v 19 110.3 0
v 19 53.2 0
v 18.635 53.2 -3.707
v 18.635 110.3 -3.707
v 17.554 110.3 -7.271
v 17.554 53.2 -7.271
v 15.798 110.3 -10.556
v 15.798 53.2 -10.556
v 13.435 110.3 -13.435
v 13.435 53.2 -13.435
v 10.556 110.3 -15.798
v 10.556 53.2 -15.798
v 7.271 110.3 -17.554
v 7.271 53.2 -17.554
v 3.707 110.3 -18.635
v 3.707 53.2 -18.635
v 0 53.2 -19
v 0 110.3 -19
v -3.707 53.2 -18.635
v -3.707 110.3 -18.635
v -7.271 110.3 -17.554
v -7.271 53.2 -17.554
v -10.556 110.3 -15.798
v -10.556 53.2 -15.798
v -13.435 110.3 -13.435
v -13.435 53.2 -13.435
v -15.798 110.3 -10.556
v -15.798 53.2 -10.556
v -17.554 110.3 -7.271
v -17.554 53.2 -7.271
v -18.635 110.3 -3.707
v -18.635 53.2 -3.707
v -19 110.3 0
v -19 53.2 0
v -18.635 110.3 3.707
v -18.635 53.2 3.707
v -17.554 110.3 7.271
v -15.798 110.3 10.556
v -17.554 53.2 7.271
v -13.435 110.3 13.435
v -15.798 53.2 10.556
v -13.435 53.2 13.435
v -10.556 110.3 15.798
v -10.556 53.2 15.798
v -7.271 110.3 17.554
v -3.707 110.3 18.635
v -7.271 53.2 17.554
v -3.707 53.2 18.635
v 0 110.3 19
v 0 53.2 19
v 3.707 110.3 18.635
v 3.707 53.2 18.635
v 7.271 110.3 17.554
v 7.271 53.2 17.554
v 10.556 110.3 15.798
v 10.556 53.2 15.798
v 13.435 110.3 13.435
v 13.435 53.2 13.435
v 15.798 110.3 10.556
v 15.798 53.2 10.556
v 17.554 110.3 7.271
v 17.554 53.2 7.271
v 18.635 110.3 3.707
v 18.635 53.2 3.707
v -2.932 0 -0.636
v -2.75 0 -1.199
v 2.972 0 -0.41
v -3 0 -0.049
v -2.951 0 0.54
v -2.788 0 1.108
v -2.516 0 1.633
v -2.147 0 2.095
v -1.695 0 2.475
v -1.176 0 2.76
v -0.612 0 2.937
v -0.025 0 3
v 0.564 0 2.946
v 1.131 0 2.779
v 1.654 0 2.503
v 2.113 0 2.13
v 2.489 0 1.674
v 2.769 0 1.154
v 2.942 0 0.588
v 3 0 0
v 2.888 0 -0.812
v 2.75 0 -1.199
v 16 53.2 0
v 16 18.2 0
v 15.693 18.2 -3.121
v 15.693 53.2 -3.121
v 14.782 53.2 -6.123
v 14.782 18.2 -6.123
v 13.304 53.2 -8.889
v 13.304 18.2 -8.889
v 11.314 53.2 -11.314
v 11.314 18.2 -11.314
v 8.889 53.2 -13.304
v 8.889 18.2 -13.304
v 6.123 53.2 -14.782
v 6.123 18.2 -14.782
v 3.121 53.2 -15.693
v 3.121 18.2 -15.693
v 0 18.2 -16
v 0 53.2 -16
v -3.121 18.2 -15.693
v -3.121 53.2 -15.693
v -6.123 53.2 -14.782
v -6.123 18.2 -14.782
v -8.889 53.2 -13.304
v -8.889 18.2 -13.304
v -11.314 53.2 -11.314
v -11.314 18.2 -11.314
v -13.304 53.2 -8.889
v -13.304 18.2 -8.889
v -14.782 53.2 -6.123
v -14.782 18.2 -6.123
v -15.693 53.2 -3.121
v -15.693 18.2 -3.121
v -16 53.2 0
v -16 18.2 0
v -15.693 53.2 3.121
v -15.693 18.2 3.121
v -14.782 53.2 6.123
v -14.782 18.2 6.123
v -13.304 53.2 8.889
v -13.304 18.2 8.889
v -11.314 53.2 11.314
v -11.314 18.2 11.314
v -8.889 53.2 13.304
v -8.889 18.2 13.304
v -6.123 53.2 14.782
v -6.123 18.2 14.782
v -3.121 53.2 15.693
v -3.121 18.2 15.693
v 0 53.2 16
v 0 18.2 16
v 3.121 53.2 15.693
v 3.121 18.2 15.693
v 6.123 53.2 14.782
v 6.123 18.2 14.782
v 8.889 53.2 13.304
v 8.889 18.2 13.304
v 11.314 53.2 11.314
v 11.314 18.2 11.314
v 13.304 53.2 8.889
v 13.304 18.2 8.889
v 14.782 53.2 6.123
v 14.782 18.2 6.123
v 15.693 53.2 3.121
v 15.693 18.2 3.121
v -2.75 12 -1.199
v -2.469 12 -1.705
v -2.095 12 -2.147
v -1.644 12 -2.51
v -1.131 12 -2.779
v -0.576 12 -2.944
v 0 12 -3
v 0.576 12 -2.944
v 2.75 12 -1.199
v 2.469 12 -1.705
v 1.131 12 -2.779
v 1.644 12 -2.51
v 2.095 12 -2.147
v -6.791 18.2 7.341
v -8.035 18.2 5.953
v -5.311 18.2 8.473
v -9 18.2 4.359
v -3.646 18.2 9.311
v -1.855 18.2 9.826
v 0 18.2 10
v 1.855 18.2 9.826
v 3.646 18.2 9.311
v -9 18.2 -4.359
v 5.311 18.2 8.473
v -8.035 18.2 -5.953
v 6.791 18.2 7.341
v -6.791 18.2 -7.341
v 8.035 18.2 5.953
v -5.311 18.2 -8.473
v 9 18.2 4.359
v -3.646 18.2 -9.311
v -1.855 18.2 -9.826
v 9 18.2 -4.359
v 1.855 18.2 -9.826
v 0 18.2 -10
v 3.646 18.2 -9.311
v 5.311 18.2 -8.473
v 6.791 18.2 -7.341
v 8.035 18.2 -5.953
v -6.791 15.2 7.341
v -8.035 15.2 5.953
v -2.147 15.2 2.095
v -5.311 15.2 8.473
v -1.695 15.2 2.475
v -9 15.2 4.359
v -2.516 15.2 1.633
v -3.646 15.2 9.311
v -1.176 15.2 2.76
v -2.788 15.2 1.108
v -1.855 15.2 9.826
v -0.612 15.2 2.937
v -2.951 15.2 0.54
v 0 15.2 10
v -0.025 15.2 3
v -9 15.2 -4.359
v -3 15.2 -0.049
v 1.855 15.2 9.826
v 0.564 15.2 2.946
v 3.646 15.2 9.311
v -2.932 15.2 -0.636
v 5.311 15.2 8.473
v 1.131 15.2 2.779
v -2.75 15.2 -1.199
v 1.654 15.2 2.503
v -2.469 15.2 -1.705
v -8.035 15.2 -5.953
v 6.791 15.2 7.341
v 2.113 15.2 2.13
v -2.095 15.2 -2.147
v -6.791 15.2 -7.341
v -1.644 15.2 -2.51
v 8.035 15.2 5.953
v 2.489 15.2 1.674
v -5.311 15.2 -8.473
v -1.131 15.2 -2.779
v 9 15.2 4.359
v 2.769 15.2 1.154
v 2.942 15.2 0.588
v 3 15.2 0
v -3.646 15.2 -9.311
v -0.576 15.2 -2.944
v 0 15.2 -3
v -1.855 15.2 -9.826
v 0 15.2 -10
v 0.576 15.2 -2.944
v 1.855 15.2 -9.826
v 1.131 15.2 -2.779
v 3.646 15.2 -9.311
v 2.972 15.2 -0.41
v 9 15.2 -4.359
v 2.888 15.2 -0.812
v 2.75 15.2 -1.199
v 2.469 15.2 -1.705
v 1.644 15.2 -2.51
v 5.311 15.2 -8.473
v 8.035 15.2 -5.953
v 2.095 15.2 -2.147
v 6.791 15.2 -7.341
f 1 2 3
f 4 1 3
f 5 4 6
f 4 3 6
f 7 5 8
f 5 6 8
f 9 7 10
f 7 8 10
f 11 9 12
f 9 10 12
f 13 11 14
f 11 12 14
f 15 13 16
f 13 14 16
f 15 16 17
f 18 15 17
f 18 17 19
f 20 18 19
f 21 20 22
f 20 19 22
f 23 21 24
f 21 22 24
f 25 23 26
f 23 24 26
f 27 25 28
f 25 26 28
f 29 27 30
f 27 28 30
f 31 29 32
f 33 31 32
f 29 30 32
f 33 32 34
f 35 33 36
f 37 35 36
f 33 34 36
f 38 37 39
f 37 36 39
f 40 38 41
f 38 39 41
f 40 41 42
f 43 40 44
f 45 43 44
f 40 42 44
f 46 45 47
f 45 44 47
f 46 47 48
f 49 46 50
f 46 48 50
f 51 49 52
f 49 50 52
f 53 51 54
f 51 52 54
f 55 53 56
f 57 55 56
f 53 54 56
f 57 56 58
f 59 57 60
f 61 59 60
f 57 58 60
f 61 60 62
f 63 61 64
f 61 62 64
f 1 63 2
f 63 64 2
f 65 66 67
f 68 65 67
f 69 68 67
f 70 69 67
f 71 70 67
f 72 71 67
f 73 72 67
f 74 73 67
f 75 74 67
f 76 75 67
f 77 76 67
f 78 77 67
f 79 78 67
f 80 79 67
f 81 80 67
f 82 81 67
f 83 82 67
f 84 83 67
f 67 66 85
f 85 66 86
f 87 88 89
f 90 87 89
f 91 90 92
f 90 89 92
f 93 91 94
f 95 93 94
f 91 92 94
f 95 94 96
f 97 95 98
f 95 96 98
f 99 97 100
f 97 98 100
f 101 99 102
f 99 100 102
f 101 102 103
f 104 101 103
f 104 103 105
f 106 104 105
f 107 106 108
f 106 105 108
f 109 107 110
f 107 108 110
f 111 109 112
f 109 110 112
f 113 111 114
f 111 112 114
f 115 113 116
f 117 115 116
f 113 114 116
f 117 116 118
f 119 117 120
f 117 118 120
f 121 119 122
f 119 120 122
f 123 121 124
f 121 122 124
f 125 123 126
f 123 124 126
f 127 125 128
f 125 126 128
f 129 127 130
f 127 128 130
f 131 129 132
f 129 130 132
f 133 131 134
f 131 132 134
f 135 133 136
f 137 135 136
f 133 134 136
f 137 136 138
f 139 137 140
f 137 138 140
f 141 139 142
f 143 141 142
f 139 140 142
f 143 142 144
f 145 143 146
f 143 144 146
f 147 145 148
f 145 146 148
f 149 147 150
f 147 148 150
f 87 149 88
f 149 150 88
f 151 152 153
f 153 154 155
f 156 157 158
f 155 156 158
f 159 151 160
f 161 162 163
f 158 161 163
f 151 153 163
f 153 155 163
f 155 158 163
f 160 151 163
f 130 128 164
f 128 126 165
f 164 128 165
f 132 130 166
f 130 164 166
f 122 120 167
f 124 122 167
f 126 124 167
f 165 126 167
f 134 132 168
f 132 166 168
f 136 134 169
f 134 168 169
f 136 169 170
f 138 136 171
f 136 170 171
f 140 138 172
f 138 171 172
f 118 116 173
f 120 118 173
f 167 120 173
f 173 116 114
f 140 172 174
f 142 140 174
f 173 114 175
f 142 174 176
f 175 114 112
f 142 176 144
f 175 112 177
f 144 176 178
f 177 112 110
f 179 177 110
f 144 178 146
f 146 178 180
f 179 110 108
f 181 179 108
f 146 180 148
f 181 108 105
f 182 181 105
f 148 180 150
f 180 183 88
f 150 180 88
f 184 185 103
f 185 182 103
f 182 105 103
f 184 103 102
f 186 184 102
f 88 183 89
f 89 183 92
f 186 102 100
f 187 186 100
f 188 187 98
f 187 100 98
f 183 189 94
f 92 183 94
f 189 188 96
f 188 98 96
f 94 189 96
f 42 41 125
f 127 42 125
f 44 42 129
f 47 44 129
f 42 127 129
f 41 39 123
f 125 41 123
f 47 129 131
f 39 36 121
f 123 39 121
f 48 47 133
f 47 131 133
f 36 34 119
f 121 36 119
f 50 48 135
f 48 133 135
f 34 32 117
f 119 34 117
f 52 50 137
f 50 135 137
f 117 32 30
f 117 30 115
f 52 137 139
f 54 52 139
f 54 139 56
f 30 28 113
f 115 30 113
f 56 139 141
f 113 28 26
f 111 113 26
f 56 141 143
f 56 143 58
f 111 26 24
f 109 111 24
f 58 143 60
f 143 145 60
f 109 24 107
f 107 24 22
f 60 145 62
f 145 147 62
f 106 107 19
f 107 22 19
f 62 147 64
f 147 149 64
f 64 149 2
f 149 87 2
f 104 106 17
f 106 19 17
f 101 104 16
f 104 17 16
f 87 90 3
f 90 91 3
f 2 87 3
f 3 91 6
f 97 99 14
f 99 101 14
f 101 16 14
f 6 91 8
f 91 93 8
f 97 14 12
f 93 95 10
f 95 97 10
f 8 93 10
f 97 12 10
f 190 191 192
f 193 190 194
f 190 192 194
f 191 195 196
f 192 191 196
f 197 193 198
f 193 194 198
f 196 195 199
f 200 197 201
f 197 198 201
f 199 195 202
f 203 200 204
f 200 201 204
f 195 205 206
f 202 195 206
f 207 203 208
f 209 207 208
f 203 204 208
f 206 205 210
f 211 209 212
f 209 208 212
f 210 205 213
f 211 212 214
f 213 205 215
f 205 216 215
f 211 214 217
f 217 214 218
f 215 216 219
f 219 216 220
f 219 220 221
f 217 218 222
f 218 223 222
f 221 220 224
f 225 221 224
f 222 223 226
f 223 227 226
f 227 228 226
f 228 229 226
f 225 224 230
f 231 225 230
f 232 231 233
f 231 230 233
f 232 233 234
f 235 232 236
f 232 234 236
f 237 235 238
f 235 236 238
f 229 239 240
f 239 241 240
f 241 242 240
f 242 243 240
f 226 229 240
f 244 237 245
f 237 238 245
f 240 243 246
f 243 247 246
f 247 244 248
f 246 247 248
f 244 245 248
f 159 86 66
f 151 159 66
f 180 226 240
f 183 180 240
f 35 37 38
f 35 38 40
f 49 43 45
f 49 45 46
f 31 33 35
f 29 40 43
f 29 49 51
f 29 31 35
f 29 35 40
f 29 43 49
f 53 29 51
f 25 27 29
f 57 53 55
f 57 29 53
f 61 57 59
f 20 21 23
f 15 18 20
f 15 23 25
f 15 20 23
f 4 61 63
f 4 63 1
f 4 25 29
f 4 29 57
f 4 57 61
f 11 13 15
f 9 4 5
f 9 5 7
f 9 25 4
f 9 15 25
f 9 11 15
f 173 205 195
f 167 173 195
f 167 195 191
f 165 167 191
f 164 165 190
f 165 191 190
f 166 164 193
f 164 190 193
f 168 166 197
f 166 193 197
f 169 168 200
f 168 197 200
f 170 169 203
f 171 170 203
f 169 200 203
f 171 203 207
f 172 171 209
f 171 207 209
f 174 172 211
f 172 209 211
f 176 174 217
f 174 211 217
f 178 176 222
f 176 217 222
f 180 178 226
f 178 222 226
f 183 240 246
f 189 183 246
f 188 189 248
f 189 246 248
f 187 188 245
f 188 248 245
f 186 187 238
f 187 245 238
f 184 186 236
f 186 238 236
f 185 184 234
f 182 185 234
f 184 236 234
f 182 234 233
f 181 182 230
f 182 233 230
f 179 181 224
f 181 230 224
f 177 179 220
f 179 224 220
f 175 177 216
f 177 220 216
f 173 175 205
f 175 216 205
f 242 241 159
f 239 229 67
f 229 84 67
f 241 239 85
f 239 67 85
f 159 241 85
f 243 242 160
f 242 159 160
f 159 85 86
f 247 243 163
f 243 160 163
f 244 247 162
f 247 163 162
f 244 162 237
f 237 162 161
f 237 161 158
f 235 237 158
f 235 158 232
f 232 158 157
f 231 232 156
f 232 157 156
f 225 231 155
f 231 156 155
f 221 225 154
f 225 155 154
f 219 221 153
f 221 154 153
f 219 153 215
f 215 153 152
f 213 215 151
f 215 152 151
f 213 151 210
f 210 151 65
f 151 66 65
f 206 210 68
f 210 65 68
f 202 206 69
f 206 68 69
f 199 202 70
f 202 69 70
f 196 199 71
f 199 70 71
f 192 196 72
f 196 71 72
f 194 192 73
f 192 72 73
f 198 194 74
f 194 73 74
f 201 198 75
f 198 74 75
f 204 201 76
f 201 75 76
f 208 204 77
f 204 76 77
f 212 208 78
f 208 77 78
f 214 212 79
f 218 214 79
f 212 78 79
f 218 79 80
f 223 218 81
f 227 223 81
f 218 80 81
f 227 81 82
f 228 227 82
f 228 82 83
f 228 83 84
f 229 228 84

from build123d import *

# Parameters (mm, degrees)
BOSS_EXTRUDE1_DEPTH = 12
BOSS_EXTRUDE2_DEPTH = 3.2
BOSS_EXTRUDE3_DEPTH = 3
SKETCH6_R           = 16
BOSS_EXTRUDE4_DEPTH = 35
SKETCH7_R           = 19
BOSS_EXTRUDE5_DEPTH = 57.1


with BuildPart() as part:
    # Sketch2 → Boss-Extrude1 (new body)
    with BuildSketch(Plane(origin=(0, 0, 0), x_dir=(1, 0, 0), z_dir=(0, 1, 0))):
        with BuildLine():
            Line((2.75, 1.198957881), (-2.75, 1.198957881))
            ThreePointArc((-2.75, 1.198957881), (-0.612372436, -2.936835031), (3, 0))
            ThreePointArc((3, 0), (2.936835031, 0.612372436), (2.75, 1.198957881))
        make_face()
    extrude(amount=BOSS_EXTRUDE1_DEPTH)

    # Sketch3 → Boss-Extrude2 (add)
    with BuildSketch(Plane(origin=(0, 12, 0), x_dir=(1, 0, 0), z_dir=(0, 1, 0))):
        with BuildLine():
            Line((2.75, 1.198957881), (-2.75, 1.198957881))
            ThreePointArc((-2.75, 1.198957881), (-0.612372436, -2.936835031), (3, 0))
            ThreePointArc((3, 0), (2.936835031, 0.612372436), (2.75, 1.198957881))
        make_face()
        with BuildLine():
            ThreePointArc((2.75, 1.198957881), (0, 3), (-2.75, 1.198957881))
            Line((-2.75, 1.198957881), (2.75, 1.198957881))
        make_face()
        with BuildLine():
            ThreePointArc((-2.75, 1.198957881), (0, -3), (2.75, 1.198957881))
            Line((2.75, 1.198957881), (-2.75, 1.198957881))
        make_face()
    extrude(amount=BOSS_EXTRUDE2_DEPTH)

    # Sketch5 → Boss-Extrude3 (add)
    with BuildSketch(Plane(origin=(0, 15.2, 0), x_dir=(1, 0, 0), z_dir=(0, 1, 0))):
        with BuildLine():
            Line((-9, 4.358898944), (-9, -4.358898944))
            ThreePointArc((-9, -4.358898944), (0, -10), (9, -4.358898944))
            Line((9, -4.358898944), (9, 4.358898944))
            ThreePointArc((9, 4.358898944), (0, 10), (-9, 4.358898944))
        make_face()
    extrude(amount=BOSS_EXTRUDE3_DEPTH)

    # Sketch6 → Boss-Extrude4 (add)
    with BuildSketch(Plane(origin=(0, 18.2, 0), x_dir=(1, 0, 0), z_dir=(0, 1, 0))):
        Circle(SKETCH6_R)
    extrude(amount=BOSS_EXTRUDE4_DEPTH)

    # Sketch7 → Boss-Extrude5 (add)
    with BuildSketch(Plane(origin=(0, 53.2, 0), x_dir=(1, 0, 0), z_dir=(0, 1, 0))):
        Circle(SKETCH7_R)
    extrude(amount=BOSS_EXTRUDE5_DEPTH)


solid = part.part
